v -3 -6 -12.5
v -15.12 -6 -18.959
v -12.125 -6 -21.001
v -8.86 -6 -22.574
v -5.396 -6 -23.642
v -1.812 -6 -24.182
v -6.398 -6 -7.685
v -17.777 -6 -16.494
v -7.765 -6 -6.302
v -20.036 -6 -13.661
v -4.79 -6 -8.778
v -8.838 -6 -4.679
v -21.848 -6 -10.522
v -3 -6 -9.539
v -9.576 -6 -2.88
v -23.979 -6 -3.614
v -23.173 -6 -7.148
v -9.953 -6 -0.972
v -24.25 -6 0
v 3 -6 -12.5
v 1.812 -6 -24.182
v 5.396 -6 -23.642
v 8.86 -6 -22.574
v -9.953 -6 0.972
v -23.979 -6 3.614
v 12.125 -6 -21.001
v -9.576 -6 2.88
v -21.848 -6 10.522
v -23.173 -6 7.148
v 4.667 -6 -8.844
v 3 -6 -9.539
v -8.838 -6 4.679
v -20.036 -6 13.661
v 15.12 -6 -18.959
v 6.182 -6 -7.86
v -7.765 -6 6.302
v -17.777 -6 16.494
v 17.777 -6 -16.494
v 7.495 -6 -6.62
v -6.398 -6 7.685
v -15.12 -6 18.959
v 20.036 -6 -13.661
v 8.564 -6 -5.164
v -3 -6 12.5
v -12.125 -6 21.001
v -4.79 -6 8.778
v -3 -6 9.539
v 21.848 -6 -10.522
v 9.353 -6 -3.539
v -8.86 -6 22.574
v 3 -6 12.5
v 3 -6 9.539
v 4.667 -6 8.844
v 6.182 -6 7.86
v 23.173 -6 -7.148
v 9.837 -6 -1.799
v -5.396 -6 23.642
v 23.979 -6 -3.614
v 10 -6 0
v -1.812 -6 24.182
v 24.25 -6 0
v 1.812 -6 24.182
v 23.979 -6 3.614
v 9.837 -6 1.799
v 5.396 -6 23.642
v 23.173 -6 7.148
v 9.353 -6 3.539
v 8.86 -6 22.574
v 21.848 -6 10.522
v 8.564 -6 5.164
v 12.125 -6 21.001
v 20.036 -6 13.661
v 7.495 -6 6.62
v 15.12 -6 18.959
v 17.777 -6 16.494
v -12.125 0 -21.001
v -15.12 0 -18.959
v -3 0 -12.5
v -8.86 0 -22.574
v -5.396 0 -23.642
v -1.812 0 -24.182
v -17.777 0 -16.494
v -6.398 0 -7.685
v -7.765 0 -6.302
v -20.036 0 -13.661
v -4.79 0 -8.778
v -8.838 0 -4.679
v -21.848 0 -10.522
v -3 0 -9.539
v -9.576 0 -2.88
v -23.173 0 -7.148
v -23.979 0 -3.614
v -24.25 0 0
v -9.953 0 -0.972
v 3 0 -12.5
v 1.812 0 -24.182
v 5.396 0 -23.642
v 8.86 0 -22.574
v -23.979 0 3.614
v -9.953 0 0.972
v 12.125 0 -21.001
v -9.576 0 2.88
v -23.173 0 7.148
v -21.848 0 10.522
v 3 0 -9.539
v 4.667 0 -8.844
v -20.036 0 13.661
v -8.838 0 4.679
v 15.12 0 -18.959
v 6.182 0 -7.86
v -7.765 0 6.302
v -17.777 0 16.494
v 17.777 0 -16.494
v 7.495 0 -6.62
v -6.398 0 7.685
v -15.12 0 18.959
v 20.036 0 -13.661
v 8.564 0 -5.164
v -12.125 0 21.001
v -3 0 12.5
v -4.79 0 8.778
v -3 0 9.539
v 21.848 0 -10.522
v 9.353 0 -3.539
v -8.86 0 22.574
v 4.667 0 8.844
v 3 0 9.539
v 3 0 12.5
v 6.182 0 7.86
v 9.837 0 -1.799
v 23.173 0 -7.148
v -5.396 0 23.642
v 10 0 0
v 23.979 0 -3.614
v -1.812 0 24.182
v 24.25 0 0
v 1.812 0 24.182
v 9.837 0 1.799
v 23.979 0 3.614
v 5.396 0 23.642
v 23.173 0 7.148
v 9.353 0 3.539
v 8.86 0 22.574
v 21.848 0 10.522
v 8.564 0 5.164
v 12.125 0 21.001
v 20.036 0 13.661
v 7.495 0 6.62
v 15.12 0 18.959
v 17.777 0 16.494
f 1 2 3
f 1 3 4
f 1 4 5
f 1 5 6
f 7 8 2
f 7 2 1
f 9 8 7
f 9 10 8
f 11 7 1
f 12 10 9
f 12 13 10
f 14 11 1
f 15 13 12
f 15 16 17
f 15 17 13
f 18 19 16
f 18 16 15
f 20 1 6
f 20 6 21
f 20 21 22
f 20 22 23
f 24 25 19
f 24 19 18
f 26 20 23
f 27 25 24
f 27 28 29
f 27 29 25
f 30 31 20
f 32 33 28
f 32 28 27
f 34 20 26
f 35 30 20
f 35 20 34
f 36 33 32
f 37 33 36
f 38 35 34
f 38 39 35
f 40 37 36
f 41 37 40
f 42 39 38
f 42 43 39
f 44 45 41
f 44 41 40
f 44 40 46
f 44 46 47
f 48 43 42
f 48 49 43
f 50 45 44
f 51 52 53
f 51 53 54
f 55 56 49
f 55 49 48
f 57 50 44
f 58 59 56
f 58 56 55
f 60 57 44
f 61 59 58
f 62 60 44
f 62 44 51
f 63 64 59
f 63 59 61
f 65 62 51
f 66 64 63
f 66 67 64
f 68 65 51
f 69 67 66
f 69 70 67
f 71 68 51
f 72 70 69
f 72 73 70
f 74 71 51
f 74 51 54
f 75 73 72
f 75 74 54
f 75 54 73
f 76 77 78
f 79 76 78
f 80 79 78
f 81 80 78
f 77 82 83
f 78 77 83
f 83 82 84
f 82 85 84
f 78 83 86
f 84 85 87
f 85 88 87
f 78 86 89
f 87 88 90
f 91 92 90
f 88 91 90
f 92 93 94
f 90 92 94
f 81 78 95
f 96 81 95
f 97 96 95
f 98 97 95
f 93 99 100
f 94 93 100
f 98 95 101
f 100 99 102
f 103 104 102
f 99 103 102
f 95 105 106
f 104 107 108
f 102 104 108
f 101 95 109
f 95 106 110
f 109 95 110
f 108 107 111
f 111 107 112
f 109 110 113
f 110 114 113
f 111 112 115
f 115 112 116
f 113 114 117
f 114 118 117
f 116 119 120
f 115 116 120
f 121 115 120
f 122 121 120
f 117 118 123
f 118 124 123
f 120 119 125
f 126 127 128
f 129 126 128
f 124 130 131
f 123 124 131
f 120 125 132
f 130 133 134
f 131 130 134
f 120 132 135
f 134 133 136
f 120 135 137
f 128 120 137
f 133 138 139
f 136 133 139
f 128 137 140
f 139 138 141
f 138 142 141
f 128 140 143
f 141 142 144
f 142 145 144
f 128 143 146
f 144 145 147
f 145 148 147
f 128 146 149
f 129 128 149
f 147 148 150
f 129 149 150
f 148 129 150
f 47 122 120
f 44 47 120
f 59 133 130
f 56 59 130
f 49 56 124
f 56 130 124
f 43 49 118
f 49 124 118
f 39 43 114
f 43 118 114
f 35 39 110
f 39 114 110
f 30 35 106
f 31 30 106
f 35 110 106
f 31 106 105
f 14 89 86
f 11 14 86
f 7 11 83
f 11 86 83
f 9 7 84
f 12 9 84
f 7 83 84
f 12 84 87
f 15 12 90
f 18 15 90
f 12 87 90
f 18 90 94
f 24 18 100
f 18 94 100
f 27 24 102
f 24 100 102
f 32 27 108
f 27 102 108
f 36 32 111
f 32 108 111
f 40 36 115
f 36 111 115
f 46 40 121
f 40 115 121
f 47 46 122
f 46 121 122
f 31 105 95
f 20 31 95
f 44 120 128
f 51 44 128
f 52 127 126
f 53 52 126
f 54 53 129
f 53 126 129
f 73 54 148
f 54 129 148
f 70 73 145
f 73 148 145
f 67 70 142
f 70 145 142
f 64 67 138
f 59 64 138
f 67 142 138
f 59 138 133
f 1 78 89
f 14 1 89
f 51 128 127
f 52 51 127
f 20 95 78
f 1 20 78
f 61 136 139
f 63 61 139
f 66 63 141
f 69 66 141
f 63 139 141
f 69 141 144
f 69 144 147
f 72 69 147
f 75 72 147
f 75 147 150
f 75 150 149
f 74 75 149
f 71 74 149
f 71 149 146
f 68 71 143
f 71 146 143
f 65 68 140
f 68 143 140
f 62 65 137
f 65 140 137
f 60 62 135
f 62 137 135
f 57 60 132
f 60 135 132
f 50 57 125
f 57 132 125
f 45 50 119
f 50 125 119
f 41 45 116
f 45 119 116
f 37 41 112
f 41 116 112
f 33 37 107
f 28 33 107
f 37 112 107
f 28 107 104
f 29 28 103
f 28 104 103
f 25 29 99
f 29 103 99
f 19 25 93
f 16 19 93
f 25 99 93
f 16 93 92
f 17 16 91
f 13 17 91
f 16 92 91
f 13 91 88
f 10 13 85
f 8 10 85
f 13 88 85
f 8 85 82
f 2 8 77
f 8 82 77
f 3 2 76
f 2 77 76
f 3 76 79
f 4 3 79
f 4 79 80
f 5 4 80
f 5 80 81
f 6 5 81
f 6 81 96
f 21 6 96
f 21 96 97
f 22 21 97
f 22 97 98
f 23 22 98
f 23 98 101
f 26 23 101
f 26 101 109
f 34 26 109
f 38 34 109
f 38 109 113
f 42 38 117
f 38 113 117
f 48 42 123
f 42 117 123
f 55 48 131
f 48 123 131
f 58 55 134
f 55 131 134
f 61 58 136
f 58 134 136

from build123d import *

# Parameters (mm, degrees)
F0_R     = 24.25
F1_DEPTH = 6


with BuildPart() as f1:
    # F0 (on Front) → F1 (new body)
    with BuildSketch(Plane.XZ):
        Circle(F0_R)
        with BuildLine():
            ThreePointArc((3, 9.539392), (8.062258, 5.91608), (10, 0))
            ThreePointArc((10, 0), (8.062258, -5.91608), (3, -9.539392))
            Line((3, -9.539392), (3, -12.5))
            Line((3, -12.5), (-3, -12.5))
            Line((-3, -12.5), (-3, -9.539392))
            ThreePointArc((-3, -9.539392), (-10, 0), (-3, 9.539392))
            Line((-3, 9.539392), (-3, 12.5))
            Line((-3, 12.5), (3, 12.5))
            Line((3, 12.5), (3, 9.539392))
        make_face(mode=Mode.SUBTRACT)
    extrude(amount=F1_DEPTH)


solid = f1.part
